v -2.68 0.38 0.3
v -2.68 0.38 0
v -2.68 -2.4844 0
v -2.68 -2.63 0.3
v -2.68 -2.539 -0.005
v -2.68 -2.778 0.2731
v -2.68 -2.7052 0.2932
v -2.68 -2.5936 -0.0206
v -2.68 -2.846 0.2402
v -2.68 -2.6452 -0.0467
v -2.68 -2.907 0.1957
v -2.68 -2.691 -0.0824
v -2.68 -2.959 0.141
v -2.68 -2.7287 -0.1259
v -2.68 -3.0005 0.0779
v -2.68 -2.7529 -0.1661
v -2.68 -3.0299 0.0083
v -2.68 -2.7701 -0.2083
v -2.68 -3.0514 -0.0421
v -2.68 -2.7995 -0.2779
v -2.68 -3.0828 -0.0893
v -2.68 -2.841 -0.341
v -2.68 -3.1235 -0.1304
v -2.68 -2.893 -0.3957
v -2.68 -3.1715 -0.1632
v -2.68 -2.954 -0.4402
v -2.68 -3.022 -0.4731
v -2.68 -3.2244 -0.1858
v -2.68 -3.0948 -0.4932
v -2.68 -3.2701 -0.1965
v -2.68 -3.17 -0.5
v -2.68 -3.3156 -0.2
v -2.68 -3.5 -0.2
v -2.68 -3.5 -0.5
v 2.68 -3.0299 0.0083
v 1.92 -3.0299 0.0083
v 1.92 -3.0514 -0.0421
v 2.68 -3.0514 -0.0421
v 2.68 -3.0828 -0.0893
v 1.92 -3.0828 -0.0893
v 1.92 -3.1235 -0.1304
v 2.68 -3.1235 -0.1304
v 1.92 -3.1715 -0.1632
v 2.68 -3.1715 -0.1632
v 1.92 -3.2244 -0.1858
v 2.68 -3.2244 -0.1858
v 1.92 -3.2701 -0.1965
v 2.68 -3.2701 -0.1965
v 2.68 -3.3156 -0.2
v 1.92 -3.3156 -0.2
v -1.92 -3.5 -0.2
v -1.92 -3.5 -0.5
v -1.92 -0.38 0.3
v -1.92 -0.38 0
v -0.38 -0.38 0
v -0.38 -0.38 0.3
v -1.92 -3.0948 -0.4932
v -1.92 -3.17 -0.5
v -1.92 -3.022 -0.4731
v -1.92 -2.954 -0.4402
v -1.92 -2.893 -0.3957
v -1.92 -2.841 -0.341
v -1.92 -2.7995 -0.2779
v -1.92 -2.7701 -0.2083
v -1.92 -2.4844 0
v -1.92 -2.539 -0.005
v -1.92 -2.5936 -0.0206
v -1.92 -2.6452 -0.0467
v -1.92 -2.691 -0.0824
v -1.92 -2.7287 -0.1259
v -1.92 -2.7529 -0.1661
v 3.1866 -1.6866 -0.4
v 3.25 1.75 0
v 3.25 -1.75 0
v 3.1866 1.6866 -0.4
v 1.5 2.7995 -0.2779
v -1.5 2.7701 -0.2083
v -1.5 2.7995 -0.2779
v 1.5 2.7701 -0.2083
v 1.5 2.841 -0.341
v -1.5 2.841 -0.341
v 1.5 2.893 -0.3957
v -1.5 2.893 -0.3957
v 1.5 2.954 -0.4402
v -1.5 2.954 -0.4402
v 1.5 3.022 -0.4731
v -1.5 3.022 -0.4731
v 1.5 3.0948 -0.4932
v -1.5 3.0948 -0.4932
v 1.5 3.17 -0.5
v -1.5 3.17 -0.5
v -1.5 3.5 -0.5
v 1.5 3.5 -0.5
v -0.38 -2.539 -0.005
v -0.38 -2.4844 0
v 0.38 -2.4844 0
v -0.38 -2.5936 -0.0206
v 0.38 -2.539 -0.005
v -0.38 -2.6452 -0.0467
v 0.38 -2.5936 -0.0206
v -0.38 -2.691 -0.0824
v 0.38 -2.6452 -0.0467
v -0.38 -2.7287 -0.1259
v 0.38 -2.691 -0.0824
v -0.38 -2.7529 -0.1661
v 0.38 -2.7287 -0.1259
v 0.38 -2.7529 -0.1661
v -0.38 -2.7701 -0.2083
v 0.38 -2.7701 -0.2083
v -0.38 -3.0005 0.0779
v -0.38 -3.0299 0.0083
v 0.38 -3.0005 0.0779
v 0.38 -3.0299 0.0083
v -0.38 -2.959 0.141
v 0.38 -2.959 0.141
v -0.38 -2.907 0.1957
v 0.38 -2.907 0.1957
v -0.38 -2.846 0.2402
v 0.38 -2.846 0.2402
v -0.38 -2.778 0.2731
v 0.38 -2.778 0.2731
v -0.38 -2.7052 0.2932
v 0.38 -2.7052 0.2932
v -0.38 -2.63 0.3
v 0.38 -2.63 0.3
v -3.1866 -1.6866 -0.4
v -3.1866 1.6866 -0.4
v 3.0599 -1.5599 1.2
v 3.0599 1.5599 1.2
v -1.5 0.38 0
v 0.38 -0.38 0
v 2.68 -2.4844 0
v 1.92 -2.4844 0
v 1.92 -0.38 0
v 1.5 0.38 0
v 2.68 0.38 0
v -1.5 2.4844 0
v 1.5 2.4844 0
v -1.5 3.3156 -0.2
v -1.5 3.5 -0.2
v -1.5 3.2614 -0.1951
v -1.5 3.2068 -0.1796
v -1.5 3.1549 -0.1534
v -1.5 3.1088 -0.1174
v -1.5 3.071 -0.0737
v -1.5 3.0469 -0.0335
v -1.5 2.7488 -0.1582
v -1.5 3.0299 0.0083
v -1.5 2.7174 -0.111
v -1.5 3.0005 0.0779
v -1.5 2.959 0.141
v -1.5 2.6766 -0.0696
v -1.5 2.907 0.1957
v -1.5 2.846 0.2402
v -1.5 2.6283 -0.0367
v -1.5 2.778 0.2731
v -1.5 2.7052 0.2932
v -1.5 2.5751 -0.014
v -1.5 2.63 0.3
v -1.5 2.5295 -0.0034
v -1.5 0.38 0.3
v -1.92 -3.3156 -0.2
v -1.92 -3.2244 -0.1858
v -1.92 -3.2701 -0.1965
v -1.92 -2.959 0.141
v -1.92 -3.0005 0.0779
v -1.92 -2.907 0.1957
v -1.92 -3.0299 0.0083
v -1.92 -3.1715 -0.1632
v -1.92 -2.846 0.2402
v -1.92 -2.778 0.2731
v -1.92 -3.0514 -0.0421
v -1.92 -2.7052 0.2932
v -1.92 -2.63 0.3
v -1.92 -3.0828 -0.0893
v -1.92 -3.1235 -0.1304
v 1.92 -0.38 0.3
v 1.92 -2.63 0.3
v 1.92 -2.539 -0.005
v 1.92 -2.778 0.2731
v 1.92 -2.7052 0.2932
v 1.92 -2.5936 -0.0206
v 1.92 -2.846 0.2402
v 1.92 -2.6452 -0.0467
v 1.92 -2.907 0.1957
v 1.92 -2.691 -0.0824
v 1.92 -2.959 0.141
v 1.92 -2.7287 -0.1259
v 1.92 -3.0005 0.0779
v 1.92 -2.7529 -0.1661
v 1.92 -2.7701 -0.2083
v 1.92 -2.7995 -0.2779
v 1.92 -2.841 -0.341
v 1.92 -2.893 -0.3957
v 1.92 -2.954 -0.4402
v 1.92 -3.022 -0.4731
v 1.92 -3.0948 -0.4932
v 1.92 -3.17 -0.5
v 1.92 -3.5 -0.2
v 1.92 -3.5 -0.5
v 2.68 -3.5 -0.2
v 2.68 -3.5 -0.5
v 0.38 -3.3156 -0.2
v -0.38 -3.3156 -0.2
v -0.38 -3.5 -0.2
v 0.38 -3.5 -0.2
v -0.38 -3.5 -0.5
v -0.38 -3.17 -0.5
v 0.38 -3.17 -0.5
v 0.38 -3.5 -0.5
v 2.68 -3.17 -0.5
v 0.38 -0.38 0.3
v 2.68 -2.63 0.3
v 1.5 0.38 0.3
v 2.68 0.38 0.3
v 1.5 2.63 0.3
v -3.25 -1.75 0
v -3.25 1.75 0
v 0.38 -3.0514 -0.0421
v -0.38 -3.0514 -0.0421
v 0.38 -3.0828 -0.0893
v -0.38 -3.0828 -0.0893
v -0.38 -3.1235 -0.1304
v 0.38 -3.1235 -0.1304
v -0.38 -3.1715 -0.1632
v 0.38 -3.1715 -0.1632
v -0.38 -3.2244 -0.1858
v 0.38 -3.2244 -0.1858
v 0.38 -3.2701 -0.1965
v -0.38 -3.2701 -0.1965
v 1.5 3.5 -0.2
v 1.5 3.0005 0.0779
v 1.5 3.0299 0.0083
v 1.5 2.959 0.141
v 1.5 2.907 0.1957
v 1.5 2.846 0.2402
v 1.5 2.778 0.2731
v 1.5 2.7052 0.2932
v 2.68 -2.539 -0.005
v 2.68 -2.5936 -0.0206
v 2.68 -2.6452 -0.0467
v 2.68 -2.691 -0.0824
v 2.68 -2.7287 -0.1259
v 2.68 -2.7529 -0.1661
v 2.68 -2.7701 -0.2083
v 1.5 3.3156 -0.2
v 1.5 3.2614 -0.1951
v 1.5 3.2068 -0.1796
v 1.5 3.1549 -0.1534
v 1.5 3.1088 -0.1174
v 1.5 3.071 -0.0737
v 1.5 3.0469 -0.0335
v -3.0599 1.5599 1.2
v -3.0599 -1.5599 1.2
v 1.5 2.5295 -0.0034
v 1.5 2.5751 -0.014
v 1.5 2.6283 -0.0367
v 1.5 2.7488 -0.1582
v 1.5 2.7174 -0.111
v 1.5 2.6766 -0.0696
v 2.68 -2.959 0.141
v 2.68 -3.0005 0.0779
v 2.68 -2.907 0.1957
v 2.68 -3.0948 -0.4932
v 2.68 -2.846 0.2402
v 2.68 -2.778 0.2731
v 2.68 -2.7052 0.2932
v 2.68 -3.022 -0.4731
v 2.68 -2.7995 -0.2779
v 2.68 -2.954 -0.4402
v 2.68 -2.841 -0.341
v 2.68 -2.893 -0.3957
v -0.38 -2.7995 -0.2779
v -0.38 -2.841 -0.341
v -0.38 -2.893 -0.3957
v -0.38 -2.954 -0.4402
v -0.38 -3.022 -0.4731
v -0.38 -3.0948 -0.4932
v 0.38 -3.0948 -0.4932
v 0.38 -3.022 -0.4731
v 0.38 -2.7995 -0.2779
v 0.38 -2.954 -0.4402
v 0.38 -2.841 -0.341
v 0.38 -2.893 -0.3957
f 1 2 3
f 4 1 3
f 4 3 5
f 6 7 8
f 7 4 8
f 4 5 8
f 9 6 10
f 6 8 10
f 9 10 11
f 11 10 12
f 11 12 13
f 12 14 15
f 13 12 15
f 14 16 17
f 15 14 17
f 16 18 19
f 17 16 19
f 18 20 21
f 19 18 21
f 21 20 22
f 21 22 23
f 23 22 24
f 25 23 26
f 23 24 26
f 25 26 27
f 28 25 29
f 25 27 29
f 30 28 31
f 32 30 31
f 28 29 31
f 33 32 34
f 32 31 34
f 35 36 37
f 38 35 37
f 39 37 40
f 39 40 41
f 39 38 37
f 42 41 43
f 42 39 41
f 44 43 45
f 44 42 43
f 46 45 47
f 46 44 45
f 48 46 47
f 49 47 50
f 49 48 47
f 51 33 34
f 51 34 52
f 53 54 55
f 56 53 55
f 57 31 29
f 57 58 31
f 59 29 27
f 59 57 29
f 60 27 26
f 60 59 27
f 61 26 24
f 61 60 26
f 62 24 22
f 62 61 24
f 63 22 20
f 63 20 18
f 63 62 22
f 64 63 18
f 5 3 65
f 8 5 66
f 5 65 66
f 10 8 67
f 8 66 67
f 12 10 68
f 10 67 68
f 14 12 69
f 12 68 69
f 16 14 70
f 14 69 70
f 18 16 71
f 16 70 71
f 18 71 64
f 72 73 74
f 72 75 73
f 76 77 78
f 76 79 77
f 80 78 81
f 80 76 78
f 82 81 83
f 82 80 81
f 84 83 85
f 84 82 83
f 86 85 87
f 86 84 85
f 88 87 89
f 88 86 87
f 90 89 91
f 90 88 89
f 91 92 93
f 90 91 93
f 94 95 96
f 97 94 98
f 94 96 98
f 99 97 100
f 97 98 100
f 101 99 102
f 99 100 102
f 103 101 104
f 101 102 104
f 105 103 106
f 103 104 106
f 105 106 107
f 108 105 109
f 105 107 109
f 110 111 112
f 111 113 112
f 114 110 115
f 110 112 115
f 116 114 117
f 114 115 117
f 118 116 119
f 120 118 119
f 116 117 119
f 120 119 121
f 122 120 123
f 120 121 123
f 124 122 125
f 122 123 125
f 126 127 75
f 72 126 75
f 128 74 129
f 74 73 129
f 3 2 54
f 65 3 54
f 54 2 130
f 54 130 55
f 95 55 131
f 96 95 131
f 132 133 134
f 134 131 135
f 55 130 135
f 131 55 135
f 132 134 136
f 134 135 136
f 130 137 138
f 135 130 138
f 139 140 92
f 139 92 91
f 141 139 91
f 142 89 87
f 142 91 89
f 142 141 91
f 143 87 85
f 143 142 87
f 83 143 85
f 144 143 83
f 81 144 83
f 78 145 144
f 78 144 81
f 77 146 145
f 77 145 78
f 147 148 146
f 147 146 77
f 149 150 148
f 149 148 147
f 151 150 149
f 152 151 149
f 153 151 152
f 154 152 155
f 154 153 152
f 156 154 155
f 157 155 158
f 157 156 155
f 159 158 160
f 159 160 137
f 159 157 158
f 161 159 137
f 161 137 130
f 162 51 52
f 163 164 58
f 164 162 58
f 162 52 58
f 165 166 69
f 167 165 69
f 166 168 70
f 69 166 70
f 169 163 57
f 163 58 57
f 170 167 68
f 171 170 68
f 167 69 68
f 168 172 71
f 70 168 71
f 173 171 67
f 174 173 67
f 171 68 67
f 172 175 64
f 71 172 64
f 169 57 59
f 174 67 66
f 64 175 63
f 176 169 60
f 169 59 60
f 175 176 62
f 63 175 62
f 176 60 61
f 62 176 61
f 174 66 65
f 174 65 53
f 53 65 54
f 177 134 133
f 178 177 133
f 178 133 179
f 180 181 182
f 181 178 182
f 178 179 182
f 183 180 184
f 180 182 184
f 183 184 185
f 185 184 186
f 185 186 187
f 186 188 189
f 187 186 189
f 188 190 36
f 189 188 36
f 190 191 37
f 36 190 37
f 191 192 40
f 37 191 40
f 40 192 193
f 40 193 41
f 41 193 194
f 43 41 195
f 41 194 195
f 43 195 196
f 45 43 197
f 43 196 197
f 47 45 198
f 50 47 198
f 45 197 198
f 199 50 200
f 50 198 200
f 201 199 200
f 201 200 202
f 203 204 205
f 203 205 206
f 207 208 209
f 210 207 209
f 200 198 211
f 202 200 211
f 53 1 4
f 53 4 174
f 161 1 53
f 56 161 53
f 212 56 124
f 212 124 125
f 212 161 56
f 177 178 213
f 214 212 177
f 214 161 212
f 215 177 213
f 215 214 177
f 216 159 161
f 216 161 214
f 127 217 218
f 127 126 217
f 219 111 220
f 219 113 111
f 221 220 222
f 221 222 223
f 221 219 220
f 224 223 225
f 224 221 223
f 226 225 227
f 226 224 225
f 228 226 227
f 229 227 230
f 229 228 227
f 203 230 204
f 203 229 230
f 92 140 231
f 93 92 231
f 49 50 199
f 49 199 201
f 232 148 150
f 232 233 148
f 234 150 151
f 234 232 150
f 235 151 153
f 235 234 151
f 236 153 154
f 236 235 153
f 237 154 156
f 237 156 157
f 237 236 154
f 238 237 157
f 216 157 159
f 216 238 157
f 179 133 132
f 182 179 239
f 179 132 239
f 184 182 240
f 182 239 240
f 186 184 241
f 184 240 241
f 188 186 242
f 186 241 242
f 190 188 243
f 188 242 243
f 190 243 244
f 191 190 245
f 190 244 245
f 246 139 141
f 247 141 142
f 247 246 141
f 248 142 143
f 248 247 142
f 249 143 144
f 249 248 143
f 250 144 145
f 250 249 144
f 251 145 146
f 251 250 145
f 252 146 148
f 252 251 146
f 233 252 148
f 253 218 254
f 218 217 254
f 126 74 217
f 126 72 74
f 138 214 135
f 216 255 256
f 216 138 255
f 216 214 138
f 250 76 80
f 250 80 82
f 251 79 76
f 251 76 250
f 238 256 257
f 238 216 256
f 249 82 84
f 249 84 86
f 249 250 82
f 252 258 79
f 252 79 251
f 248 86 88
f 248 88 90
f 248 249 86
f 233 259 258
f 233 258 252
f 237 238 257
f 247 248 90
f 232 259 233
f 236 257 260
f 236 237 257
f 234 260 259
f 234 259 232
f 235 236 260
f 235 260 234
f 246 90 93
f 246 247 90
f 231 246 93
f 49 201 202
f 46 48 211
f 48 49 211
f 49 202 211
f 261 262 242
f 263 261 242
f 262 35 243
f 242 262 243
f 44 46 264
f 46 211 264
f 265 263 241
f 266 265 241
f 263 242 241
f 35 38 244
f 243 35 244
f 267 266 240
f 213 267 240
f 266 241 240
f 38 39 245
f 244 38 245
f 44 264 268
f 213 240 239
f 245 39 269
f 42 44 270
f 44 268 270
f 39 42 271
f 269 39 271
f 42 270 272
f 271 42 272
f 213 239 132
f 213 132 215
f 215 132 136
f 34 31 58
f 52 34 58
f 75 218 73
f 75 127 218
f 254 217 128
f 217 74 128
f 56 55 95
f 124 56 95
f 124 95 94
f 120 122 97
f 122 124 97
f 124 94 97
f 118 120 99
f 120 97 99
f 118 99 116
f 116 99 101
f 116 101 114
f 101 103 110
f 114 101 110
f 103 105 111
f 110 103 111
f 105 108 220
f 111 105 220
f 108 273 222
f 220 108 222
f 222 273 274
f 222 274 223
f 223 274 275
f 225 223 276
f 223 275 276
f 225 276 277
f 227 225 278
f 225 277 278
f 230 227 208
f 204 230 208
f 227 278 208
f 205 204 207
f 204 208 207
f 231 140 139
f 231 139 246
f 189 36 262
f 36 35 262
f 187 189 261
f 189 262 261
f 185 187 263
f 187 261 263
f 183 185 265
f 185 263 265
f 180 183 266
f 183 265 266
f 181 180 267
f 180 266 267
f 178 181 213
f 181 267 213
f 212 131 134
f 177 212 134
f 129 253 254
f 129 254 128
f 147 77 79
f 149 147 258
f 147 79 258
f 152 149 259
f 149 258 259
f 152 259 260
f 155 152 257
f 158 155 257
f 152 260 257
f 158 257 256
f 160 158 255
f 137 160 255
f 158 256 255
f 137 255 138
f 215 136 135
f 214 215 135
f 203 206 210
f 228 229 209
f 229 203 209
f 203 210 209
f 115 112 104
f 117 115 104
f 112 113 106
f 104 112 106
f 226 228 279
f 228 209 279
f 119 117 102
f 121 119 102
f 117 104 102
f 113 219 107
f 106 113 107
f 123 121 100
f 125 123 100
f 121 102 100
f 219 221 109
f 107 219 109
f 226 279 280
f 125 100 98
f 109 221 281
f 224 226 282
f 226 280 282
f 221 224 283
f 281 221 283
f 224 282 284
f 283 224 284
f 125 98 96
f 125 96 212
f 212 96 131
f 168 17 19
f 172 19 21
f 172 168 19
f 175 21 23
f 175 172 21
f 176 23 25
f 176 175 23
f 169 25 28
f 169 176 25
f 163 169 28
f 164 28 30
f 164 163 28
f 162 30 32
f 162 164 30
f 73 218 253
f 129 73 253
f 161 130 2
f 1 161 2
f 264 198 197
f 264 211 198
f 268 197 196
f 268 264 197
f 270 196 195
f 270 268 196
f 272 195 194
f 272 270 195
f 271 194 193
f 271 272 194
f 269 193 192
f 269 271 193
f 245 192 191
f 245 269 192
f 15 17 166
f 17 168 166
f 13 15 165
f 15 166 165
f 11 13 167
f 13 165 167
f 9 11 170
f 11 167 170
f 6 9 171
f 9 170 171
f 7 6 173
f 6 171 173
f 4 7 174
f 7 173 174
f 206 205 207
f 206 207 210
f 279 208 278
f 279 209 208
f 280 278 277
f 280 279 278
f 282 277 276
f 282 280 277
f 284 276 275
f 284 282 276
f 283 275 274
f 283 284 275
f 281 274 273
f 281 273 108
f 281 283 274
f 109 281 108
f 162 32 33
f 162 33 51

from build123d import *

# Parameters (mm, degrees)
F3_W      = 3
F3_H      = 1.37
F3_W_2    = 1.54
F3_W_3    = 0.76
F3_H_2    = 0.38
F4_DEPTH  = 1.2
F4_TAPER  = 9
F4_FACE_W = 6.5
F4_FACE_H = 3.5
F5_DEPTH  = 0.4
F5_TAPER  = 9
F3_H_3    = 1
F3_H_4    = 0.3
F6_DEPTH  = 0.3
F3_H_5    = 0.45
F7_DEPTH  = 0.5
F8_DEPTH  = 0.2
F9_R      = 0.42
F10_R     = 0.3


with BuildPart() as f4:
    # F3 (on Top) → F4 (new body)
    with BuildSketch(Plane.XY):
        Polygon((2.68, -1.75), (3.25, -1.75), (3.25, 1.75), (1.5, 1.75), (1.5, 0.38), (2.68, 0.38), (2.68, 0), (2.68, -0.38), align=None)
        with Locations((0, 1.065)):
            Rectangle(F3_W, F3_H)
        with Locations((1.15, -1.065)):
            Rectangle(F3_W_2, F3_H)
        Polygon((1.5, 0), (1.5, 0.38), (-1.5, 0.38), (-1.5, 0), (-0.38, 0), (0.38, 0), align=None)
        Polygon((0.38, -0.38), (1.92, -0.38), (1.92, 0), (2.68, 0), (2.68, 0.38), (1.5, 0.38), (1.5, 0), (0.38, 0), align=None)
        with Locations((2.3, -0.19)):
            Rectangle(F3_W_3, F3_H_2)
        with Locations((2.3, -1.065)):
            Rectangle(F3_W_3, F3_H)
        with Locations((0, -1.065)):
            Rectangle(F3_W_3, F3_H)
        with Locations((0, -0.19)):
            Rectangle(F3_W_3, F3_H_2)
        with Locations((-1.15, -1.065)):
            Rectangle(F3_W_2, F3_H)
        Polygon((-1.5, 0), (-1.5, 0.38), (-2.68, 0.38), (-2.68, 0), (-1.92, 0), (-1.92, -0.38), (-0.38, -0.38), (-0.38, 0), align=None)
        Polygon((-1.5, 0.38), (-1.5, 1.75), (-3.25, 1.75), (-3.25, -1.75), (-2.68, -1.75), (-2.68, -0.38), (-2.68, 0), (-2.68, 0.38), align=None)
        with Locations((-2.3, -0.19)):
            Rectangle(F3_W_3, F3_H_2)
        with Locations((-2.3, -1.065)):
            Rectangle(F3_W_3, F3_H)
    extrude(amount=F4_DEPTH, taper=F4_TAPER)

    # F4_face (on face) → F5 (join)
    with BuildSketch(Plane(origin=(0, 0, 0), x_dir=(1, 0, 0), z_dir=(0, 0, -1))):
        Rectangle(F4_FACE_W, F4_FACE_H)
    extrude(amount=F5_DEPTH, taper=F5_TAPER)


with BuildPart() as f6:
    # F3 (on Top) → F6 (new body)
    with BuildSketch(Plane.XY):
        with Locations((0, 1.065)):
            Rectangle(F3_W, F3_H)
        Polygon((1.5, 0), (1.5, 0.38), (-1.5, 0.38), (-1.5, 0), (-0.38, 0), (0.38, 0), align=None)
        Polygon((-1.5, 0), (-1.5, 0.38), (-2.68, 0.38), (-2.68, 0), (-1.92, 0), (-1.92, -0.38), (-0.38, -0.38), (-0.38, 0), align=None)
        with Locations((-2.3, -1.065)):
            Rectangle(F3_W_3, F3_H)
        with Locations((-2.3, -0.19)):
            Rectangle(F3_W_3, F3_H_2)
        with Locations((0, -1.065)):
            Rectangle(F3_W_3, F3_H)
        Polygon((0.38, -0.38), (1.92, -0.38), (1.92, 0), (2.68, 0), (2.68, 0.38), (1.5, 0.38), (1.5, 0), (0.38, 0), align=None)
        with Locations((0, -0.19)):
            Rectangle(F3_W_3, F3_H_2)
        with Locations((2.3, -1.065)):
            Rectangle(F3_W_3, F3_H)
        with Locations((2.3, -0.19)):
            Rectangle(F3_W_3, F3_H_2)
        with Locations((-2.3, -2.25)):
            Rectangle(F3_W_3, F3_H_3)
        with Locations((-2.3, -2.9)):
            Rectangle(F3_W_3, F3_H_4)
        with Locations((0, -2.25)):
            Rectangle(F3_W_3, F3_H_3)
        with Locations((0, -2.9)):
            Rectangle(F3_W_3, F3_H_4)
        with Locations((2.3, -2.25)):
            Rectangle(F3_W_3, F3_H_3)
        with Locations((2.3, -2.9)):
            Rectangle(F3_W_3, F3_H_4)
        with Locations((0, 2.25)):
            Rectangle(F3_W, F3_H_3)
        with Locations((0, 2.9)):
            Rectangle(F3_W, F3_H_4)
    extrude(amount=F6_DEPTH)

    # F3 (on Top) → F7 (join)
    with BuildSketch(Plane.XY):
        with Locations((0, 3.275)):
            Rectangle(F3_W, F3_H_5)
        with Locations((0, 2.9)):
            Rectangle(F3_W, F3_H_4)
        with Locations((-2.3, -2.9)):
            Rectangle(F3_W_3, F3_H_4)
        with Locations((-2.3, -3.275)):
            Rectangle(F3_W_3, F3_H_5)
        with Locations((0, -3.275)):
            Rectangle(F3_W_3, F3_H_5)
        with Locations((2.3, -3.275)):
            Rectangle(F3_W_3, F3_H_5)
        with Locations((0, -2.9)):
            Rectangle(F3_W_3, F3_H_4)
        with Locations((2.3, -2.9)):
            Rectangle(F3_W_3, F3_H_4)
    extrude(amount=-F7_DEPTH)

    # F3 (on Top) → F8 (cut)
    with BuildSketch(Plane.XY):
        with Locations((0, 3.275)):
            Rectangle(F3_W, F3_H_5)
        with Locations((-2.3, -3.275)):
            Rectangle(F3_W_3, F3_H_5)
        with Locations((0, -3.275)):
            Rectangle(F3_W_3, F3_H_5)
        with Locations((2.3, -3.275)):
            Rectangle(F3_W_3, F3_H_5)
    extrude(amount=-F8_DEPTH, mode=Mode.SUBTRACT)

    # F9
    f9_edges = [f6.edges().sort_by_distance(p)[0] for p in [
        (-2.3, -3.05, 0.3),
        (0, -3.05, 0.3),
        (2.3, -3.05, 0.3),
        (0, 3.05, 0.3),
        (0, 2.75, -0.5),
        (2.3, -2.75, -0.5),
        (0, -2.75, -0.5),
        (-2.3, -2.75, -0.5),
    ]]
    fillet(f9_edges, radius=F9_R)

    # F10
    f10_edges = [f6.edges().sort_by_distance(p)[0] for p in [
        (-2.3, -3.05, -0.2),
        (0, -3.05, -0.2),
        (2.3, -3.05, -0.2),
        (0, 3.05, -0.2),
        (0, 2.75, 0),
        (2.3, -2.75, 0),
        (0, -2.75, 0),
        (-2.3, -2.75, 0),
    ]]
    fillet(f10_edges, radius=F10_R)


solid = Compound([f4.part, f6.part])
